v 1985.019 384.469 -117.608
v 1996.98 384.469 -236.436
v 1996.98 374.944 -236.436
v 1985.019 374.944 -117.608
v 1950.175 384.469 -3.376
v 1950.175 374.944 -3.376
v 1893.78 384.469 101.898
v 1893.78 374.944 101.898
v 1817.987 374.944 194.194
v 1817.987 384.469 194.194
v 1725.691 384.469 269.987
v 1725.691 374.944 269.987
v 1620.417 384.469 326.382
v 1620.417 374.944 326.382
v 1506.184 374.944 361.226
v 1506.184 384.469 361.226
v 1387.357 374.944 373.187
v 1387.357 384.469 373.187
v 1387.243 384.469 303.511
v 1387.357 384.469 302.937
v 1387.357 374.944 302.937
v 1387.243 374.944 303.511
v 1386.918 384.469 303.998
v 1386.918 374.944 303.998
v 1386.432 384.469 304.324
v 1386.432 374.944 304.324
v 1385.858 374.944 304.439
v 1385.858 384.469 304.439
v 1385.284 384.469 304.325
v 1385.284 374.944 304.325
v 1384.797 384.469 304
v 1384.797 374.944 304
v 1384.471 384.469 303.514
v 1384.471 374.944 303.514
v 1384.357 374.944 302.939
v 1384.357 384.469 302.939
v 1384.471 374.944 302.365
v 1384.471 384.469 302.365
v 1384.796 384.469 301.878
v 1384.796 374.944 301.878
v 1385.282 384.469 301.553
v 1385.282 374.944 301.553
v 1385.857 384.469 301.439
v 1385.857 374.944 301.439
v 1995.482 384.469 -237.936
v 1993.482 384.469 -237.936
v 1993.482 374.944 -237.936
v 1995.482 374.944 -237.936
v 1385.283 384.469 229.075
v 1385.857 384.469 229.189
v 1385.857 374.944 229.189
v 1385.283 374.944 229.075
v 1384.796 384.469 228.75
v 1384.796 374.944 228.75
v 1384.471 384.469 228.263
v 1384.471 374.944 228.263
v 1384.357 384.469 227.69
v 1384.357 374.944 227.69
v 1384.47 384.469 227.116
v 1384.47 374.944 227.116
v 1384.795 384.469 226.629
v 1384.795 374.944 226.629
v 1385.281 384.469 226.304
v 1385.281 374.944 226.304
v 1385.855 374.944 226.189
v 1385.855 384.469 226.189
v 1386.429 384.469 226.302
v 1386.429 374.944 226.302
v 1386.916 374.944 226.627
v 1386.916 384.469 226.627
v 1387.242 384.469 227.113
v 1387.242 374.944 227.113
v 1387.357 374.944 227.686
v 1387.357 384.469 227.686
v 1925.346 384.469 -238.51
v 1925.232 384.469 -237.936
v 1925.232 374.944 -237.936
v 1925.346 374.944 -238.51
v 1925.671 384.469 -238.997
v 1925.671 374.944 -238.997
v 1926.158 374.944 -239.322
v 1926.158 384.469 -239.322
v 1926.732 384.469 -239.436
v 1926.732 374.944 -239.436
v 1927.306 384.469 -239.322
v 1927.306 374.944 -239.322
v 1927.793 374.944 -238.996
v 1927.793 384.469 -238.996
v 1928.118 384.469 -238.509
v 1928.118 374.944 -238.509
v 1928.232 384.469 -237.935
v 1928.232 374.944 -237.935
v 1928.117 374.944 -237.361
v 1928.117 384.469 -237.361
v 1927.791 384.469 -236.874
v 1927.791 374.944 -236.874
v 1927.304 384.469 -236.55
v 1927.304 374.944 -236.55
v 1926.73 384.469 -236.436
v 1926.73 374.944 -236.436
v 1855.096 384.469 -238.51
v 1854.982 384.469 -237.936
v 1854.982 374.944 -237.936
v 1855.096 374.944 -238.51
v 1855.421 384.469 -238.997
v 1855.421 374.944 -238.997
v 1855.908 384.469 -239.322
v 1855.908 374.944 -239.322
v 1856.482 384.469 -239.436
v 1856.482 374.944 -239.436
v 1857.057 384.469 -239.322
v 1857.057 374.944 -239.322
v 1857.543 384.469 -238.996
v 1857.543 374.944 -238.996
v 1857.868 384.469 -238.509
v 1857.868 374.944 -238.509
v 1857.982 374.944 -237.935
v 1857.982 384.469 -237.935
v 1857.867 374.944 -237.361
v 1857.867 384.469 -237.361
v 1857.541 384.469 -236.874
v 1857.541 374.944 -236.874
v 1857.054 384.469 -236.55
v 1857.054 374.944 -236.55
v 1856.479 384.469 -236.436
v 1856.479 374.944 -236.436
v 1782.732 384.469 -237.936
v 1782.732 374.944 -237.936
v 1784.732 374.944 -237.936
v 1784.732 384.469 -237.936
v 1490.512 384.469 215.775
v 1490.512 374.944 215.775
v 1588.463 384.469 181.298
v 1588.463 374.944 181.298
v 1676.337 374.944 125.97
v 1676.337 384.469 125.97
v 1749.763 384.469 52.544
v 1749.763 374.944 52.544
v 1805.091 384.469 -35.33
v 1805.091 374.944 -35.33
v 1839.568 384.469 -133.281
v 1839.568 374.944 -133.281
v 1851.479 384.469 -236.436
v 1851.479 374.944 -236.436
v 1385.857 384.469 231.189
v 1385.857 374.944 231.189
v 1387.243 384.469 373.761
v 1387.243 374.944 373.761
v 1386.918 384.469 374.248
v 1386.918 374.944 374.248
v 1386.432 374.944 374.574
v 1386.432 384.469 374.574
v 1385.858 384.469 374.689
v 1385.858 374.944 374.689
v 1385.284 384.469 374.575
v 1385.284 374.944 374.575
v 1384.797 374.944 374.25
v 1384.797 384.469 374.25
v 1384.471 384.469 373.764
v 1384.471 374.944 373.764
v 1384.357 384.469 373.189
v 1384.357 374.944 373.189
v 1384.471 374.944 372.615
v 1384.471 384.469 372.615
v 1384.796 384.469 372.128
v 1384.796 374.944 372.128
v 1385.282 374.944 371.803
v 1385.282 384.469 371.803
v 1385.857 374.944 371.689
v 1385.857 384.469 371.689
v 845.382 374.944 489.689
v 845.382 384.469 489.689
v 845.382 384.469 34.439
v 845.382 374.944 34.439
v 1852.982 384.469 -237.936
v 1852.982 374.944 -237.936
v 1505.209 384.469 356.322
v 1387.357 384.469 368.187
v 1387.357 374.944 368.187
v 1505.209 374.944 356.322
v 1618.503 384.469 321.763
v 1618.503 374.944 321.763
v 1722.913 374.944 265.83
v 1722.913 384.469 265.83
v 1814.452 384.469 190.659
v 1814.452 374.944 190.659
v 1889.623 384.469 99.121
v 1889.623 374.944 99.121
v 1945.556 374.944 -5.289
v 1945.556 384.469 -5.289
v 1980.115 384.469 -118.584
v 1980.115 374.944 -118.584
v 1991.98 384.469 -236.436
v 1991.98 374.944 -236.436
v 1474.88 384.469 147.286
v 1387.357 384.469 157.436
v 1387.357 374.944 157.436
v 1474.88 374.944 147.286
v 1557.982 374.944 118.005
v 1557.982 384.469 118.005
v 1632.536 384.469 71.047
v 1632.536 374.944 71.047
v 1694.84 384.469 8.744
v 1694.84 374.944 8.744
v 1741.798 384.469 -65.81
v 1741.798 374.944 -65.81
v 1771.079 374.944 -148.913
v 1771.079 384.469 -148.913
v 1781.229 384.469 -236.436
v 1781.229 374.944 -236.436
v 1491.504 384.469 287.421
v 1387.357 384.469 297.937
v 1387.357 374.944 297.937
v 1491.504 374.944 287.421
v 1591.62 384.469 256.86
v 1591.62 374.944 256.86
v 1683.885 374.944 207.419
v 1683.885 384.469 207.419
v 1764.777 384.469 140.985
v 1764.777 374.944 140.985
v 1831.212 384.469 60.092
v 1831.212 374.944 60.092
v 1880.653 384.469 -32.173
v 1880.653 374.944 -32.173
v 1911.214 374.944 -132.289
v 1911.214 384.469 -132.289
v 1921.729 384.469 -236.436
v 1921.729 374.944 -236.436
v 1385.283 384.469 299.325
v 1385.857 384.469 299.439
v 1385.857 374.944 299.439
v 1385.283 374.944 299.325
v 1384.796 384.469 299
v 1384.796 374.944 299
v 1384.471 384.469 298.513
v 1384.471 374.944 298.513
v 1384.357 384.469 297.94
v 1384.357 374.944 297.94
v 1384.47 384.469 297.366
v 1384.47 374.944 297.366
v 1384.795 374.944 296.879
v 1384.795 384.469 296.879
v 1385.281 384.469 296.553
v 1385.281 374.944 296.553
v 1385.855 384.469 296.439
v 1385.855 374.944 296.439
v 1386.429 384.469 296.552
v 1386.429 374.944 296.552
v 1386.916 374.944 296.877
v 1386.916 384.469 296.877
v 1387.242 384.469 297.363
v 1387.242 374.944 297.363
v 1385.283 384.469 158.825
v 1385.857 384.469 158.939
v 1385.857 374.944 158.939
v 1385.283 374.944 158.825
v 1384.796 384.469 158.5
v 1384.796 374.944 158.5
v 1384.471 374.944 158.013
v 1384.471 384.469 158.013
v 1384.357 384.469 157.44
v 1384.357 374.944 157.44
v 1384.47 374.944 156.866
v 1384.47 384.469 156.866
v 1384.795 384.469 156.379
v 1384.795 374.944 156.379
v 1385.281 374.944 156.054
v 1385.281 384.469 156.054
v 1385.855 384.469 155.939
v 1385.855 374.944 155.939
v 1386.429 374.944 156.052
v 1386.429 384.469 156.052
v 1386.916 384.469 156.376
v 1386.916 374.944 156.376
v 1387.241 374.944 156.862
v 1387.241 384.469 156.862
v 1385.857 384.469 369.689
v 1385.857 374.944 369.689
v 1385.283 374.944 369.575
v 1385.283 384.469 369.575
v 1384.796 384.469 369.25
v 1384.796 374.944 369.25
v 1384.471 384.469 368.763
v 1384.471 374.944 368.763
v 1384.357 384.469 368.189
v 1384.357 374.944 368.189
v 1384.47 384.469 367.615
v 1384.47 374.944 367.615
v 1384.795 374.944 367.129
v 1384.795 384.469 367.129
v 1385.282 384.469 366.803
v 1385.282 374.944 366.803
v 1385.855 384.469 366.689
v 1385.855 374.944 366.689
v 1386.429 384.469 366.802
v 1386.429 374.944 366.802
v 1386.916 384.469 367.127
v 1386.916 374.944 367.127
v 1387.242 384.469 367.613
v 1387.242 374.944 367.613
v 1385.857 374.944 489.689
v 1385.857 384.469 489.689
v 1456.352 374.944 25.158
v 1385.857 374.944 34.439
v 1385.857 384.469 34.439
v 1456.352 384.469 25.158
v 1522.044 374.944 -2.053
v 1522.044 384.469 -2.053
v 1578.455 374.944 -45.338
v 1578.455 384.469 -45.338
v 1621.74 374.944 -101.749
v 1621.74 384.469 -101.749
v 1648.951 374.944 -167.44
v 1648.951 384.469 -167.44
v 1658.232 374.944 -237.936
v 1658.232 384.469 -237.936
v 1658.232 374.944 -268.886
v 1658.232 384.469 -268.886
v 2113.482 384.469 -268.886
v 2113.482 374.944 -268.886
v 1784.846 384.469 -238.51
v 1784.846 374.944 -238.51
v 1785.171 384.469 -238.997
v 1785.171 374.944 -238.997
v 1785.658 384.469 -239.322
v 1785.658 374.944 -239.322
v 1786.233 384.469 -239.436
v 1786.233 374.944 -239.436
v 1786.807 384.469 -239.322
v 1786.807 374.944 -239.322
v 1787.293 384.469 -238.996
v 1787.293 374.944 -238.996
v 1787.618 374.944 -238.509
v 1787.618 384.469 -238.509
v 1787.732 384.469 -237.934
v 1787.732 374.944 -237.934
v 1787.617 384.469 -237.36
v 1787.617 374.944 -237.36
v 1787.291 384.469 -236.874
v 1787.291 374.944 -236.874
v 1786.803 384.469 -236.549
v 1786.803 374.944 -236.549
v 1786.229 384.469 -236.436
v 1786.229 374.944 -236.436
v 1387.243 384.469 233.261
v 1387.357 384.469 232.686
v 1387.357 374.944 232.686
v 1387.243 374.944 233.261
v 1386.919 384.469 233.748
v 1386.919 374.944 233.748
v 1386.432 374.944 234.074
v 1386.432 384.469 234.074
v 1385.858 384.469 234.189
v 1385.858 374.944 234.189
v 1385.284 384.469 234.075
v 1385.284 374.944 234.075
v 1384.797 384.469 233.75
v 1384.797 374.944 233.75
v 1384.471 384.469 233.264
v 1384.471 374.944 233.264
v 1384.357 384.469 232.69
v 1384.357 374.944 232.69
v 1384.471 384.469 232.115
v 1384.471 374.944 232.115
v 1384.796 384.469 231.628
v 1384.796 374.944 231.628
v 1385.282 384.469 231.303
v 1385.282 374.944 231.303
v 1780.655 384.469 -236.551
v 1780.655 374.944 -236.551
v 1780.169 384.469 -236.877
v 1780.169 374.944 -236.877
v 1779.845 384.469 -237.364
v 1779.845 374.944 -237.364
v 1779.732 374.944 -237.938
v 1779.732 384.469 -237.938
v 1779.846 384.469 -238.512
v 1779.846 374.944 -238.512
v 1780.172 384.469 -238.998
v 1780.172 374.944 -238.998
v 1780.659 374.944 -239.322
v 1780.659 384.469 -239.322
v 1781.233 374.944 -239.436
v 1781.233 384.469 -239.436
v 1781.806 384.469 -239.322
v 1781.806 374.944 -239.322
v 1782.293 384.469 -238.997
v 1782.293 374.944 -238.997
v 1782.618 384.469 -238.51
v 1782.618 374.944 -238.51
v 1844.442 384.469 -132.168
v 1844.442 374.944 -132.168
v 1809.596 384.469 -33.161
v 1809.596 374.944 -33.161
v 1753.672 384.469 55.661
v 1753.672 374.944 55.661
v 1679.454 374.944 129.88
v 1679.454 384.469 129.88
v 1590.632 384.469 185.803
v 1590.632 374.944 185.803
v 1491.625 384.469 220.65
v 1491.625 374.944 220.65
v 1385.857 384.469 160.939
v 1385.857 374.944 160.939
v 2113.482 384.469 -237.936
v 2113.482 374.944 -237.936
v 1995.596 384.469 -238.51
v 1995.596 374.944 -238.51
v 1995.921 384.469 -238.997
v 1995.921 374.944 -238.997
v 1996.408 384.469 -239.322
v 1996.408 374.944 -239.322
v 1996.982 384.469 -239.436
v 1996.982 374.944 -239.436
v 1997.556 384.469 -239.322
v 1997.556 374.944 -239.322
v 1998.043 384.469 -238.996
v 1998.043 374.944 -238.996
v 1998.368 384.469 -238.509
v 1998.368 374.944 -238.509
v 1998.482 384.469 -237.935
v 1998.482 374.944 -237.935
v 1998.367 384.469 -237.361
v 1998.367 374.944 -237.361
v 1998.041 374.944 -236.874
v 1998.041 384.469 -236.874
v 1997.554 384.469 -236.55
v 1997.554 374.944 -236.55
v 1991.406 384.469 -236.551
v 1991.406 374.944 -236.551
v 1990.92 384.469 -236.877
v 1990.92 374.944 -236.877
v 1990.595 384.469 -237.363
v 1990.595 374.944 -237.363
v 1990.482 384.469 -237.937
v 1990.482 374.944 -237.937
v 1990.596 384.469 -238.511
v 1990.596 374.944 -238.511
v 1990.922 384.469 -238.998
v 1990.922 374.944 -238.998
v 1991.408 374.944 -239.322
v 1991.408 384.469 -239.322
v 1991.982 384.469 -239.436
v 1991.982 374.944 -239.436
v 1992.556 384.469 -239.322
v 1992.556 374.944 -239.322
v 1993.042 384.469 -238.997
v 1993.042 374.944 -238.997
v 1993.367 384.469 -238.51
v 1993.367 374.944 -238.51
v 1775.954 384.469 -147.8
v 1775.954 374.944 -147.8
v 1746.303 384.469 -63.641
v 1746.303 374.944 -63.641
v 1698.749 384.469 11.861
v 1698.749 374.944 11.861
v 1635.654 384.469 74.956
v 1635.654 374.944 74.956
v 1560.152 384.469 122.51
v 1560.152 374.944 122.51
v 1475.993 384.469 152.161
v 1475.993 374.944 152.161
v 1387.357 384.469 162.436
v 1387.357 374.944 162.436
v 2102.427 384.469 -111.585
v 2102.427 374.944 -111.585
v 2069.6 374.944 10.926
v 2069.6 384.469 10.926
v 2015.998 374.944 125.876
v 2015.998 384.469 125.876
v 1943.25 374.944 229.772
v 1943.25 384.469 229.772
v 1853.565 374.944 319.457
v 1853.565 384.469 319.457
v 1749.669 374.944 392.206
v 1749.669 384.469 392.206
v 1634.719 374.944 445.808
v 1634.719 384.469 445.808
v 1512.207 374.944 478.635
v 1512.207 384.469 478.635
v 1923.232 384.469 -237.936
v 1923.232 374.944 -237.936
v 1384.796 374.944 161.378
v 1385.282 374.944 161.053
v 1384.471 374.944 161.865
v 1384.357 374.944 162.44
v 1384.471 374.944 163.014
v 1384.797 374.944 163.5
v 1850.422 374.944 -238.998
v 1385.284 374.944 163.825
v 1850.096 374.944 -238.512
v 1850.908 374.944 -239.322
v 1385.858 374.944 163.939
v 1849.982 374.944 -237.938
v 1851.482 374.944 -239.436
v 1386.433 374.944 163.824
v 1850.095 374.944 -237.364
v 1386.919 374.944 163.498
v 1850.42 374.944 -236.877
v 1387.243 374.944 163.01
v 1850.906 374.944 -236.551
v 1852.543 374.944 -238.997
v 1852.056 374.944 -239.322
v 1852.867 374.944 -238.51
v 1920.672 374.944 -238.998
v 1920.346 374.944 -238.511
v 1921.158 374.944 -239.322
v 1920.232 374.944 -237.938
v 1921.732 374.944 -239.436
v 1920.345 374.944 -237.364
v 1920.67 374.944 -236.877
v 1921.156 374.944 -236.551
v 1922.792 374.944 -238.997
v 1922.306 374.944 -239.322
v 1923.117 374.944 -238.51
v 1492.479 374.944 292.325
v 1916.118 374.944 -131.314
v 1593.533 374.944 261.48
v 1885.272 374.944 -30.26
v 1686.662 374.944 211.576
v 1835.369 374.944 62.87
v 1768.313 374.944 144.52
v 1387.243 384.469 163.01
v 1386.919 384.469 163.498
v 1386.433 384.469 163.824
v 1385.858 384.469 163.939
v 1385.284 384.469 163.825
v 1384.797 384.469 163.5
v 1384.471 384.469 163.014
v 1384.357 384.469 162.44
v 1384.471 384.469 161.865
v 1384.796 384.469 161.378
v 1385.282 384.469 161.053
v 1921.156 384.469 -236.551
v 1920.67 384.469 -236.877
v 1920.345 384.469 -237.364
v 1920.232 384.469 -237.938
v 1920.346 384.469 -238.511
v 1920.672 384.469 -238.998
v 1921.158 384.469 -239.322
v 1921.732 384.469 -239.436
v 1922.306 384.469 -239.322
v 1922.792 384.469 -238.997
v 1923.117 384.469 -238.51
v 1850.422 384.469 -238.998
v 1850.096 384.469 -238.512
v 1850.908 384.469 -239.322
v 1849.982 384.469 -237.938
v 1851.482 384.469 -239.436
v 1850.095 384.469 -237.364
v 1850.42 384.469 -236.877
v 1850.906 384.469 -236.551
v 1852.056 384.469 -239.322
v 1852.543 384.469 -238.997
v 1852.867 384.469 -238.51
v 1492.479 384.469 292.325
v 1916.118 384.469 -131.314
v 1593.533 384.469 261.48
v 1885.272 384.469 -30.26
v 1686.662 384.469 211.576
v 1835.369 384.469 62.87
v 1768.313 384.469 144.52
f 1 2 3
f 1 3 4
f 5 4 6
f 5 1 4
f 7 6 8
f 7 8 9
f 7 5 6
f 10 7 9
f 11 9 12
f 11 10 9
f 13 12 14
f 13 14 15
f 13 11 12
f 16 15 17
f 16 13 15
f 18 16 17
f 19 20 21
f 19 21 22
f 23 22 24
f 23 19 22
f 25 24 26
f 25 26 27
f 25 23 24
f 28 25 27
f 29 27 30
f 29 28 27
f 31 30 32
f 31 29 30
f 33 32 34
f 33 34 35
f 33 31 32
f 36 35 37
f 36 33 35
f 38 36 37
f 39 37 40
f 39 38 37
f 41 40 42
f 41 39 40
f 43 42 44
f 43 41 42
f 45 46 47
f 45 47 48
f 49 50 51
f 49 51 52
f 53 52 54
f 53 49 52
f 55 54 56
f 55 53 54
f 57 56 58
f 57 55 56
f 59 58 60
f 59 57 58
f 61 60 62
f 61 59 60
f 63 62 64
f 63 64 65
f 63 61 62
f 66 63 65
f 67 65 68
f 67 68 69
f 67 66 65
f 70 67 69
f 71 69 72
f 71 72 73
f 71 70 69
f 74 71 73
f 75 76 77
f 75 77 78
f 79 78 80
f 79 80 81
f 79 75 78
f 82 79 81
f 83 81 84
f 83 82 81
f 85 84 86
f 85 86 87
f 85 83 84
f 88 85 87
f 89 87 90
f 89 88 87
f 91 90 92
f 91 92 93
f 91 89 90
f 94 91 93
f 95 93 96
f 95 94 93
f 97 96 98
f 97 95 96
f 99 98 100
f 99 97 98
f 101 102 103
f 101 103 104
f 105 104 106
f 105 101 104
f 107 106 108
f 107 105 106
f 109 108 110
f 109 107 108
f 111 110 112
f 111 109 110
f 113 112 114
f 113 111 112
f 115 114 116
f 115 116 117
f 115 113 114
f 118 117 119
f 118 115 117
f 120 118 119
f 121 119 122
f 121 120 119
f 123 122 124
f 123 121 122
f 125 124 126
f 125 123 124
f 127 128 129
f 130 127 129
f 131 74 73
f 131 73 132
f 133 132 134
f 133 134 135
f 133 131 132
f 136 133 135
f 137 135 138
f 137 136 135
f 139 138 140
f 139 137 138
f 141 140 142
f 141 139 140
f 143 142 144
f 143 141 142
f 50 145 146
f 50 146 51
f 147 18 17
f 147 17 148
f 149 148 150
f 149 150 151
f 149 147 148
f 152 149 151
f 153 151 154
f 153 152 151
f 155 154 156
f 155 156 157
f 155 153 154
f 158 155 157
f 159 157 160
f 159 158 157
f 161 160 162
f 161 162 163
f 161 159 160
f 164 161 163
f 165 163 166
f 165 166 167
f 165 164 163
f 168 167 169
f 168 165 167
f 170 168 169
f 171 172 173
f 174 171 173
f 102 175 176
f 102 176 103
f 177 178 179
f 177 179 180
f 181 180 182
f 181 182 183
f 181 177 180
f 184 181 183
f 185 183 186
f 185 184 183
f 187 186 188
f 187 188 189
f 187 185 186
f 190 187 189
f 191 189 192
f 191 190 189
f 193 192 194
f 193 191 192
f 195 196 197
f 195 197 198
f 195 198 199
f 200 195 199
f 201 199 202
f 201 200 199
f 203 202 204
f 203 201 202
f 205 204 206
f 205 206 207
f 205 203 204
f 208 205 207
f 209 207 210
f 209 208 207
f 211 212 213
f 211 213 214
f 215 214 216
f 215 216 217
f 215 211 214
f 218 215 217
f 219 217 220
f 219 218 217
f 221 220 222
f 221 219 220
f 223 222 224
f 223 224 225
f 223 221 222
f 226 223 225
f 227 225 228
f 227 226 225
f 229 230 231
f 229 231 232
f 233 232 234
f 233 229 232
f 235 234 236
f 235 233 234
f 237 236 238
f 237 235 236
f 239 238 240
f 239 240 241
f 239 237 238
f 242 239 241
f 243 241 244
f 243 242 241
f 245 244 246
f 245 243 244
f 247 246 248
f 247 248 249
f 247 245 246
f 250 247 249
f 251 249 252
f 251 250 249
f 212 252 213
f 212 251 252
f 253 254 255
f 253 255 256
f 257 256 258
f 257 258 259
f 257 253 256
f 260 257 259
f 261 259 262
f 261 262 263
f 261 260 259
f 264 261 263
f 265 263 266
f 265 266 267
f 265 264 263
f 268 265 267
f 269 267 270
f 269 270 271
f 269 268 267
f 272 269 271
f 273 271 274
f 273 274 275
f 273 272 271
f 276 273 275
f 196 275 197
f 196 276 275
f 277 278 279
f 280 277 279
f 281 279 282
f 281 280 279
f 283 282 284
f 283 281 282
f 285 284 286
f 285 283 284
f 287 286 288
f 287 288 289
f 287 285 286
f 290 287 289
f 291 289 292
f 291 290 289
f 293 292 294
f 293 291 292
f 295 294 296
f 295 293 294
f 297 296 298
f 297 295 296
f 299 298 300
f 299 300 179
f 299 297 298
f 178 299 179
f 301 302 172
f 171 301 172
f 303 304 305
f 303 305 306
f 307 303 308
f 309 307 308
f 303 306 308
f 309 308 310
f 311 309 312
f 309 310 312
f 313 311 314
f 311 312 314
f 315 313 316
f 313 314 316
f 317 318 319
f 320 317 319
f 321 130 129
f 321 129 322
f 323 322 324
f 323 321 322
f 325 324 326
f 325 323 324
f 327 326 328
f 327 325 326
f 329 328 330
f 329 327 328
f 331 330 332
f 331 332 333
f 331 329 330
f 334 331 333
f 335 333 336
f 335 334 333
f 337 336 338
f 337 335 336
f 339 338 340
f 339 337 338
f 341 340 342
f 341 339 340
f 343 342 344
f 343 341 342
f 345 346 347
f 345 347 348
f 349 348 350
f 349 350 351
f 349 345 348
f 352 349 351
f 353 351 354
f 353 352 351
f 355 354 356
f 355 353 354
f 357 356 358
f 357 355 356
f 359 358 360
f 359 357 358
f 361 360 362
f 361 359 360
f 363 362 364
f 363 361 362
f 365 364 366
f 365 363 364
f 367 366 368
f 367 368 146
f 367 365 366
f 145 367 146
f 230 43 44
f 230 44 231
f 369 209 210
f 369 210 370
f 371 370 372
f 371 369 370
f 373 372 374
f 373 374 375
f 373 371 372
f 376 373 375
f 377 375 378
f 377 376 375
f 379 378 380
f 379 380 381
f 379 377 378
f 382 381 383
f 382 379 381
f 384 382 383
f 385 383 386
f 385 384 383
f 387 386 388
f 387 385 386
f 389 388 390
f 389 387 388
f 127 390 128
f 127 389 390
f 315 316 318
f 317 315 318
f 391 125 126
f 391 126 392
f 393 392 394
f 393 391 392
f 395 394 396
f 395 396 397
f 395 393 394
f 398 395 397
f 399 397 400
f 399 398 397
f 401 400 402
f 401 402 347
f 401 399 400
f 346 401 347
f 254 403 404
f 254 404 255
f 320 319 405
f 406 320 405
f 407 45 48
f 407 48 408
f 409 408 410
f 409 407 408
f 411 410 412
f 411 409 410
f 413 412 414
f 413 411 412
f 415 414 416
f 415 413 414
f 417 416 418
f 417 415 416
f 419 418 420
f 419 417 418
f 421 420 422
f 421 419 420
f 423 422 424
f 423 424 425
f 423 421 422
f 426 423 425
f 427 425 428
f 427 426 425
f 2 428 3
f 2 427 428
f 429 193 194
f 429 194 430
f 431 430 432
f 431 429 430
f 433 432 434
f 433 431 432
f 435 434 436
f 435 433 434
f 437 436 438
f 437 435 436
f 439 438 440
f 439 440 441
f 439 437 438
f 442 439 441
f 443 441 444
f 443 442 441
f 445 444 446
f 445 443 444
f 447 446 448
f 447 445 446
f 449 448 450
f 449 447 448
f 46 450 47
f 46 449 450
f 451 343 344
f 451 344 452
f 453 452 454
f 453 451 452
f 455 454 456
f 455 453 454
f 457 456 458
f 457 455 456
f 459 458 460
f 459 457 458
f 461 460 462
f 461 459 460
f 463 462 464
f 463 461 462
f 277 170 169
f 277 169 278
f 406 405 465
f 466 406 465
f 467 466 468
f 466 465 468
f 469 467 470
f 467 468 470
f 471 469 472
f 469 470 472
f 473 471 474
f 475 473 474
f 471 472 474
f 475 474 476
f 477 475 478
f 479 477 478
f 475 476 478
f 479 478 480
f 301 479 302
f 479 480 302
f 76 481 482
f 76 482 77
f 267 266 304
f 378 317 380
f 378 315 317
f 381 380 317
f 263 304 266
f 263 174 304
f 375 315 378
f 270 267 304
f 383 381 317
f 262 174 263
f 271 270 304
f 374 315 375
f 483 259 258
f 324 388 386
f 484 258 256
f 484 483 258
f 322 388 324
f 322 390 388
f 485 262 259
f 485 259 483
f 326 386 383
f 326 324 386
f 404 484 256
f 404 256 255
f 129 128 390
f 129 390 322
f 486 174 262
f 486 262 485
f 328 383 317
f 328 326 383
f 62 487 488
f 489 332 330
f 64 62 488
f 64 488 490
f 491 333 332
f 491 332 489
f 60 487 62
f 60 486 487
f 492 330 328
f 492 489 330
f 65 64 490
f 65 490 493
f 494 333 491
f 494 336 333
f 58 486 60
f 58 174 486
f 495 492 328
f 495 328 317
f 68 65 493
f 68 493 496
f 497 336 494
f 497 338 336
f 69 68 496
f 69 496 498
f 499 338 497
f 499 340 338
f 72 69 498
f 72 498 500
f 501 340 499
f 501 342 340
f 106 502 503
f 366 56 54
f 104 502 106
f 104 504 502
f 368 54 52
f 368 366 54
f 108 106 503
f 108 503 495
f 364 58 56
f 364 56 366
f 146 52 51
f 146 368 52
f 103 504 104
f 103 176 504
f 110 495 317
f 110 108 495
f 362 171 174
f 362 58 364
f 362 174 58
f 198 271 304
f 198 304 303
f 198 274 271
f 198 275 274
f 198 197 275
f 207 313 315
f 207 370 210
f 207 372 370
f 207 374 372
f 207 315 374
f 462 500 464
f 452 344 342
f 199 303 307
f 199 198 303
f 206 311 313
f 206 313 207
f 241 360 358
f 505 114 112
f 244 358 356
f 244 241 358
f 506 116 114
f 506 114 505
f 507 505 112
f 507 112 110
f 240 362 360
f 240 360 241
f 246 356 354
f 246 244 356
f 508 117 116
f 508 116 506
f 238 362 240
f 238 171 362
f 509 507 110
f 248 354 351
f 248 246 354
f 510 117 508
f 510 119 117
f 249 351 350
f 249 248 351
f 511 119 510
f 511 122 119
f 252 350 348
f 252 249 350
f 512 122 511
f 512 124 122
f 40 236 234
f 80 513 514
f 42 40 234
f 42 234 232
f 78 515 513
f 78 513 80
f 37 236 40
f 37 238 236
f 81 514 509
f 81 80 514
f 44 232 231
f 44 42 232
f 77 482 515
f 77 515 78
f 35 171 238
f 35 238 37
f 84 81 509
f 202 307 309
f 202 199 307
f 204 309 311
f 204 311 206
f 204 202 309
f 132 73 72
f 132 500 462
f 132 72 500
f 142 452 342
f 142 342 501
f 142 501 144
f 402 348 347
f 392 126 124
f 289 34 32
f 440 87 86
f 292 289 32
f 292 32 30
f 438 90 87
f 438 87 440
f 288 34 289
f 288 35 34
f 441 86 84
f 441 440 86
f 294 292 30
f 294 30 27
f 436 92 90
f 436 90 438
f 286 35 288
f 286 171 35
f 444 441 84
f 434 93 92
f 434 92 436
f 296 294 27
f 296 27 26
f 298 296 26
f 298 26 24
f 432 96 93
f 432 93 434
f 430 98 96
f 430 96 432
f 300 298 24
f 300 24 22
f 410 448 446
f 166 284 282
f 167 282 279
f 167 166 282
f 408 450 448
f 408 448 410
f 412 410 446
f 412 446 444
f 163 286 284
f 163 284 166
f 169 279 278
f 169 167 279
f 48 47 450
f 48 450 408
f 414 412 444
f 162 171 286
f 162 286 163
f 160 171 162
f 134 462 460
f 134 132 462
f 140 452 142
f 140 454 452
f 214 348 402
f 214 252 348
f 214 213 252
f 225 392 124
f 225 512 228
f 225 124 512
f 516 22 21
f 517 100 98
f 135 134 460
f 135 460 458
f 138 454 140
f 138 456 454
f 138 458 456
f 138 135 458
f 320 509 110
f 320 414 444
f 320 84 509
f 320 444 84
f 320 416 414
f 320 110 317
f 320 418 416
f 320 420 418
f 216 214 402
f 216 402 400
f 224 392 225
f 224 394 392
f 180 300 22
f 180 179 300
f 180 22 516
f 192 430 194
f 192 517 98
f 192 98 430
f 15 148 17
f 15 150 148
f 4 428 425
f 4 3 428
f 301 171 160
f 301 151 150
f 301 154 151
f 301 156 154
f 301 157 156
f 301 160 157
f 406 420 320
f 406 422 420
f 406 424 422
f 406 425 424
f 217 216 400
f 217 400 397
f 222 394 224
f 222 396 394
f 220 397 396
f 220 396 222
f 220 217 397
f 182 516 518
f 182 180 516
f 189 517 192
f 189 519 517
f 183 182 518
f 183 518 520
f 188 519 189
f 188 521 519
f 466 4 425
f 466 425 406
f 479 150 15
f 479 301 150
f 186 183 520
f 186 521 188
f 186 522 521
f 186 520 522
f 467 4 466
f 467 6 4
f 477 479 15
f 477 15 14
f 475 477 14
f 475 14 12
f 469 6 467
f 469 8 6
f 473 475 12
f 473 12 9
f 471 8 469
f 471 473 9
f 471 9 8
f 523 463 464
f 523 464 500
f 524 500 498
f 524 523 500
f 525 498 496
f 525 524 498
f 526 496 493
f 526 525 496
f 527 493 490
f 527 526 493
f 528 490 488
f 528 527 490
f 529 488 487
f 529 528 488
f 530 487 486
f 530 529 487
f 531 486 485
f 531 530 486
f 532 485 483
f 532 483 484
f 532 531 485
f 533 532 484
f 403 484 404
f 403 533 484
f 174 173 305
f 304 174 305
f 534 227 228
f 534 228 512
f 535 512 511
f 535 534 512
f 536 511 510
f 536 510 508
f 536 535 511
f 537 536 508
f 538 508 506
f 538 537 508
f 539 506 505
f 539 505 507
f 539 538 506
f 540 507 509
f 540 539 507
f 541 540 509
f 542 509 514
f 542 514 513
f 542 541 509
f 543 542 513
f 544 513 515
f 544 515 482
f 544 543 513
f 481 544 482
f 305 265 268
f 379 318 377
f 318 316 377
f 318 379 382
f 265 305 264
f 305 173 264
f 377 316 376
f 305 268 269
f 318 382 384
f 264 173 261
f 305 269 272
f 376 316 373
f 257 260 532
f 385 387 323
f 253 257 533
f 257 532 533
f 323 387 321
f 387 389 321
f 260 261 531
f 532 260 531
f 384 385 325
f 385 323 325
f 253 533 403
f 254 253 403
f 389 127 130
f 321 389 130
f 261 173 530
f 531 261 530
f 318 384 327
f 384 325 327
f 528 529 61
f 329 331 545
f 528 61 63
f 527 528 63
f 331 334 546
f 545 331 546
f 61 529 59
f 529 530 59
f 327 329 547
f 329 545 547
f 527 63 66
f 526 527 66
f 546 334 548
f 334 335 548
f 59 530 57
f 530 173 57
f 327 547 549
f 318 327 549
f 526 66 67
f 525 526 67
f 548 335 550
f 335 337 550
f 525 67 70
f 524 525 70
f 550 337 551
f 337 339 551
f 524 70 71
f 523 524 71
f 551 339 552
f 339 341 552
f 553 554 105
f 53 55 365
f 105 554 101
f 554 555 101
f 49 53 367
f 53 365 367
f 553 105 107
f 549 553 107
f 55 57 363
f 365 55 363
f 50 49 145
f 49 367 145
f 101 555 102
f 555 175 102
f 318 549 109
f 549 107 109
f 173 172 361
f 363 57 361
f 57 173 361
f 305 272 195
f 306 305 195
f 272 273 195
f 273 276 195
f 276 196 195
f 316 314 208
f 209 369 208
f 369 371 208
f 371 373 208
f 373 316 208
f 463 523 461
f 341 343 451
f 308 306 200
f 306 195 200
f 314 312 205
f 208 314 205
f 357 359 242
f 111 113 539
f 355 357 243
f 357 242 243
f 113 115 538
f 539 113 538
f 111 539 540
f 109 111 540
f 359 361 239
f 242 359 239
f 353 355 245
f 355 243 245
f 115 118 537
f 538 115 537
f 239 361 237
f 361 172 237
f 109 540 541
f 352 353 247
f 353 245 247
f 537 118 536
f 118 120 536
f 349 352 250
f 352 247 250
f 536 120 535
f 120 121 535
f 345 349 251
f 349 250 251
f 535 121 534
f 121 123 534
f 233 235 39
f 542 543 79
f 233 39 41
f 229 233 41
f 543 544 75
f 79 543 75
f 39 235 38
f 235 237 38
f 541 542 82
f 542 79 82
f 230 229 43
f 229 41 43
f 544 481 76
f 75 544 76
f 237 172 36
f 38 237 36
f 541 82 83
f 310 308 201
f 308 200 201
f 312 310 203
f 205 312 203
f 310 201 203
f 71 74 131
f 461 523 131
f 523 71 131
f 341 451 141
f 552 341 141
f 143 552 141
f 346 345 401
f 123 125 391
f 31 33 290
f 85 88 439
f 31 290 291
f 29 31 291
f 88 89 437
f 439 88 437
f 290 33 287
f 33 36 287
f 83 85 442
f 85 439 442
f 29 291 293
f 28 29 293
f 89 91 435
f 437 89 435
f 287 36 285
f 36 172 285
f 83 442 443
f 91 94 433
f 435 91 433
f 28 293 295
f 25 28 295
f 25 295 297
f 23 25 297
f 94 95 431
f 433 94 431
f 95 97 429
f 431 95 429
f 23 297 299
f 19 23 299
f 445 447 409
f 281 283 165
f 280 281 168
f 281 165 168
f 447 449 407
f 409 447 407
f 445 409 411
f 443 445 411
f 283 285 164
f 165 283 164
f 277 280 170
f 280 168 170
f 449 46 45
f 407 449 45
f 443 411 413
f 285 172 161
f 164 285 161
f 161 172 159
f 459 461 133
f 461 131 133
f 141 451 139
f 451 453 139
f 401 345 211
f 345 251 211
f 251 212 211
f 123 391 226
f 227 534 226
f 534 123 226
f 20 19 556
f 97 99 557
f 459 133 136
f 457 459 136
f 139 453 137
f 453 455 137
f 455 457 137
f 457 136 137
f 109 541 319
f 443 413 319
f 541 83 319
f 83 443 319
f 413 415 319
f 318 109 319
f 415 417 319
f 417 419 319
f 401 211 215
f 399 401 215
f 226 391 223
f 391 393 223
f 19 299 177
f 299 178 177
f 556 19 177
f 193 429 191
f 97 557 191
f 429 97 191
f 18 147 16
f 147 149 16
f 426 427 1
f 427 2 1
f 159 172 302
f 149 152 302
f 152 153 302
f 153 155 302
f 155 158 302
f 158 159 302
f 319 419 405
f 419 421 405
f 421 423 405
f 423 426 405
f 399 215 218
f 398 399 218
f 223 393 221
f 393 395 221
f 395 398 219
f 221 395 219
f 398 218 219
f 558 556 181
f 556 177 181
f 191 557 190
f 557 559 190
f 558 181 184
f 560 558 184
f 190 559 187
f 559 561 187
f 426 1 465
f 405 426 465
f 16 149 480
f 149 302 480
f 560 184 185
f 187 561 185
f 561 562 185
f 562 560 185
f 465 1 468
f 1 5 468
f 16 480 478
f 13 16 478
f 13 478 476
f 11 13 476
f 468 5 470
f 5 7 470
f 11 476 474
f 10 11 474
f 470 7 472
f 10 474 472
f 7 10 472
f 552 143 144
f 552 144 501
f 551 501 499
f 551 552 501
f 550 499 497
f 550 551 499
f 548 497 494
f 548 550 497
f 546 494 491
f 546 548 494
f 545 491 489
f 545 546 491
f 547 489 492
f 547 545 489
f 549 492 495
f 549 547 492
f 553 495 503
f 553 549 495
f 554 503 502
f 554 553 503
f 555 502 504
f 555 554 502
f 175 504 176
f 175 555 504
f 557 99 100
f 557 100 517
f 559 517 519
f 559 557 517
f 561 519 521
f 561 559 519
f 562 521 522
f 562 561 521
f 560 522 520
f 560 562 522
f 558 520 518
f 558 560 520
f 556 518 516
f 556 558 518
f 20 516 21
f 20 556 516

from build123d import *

# Parameters (mm, degrees)
BOSS_EXTRUDE1_DEPTH = 9.525


with BuildPart() as part:
    # Sketch1 → Boss-Extrude1 (new body)
    with BuildSketch(Plane.XZ.offset(-384.4690372)):
        with BuildLine():
            Line((1658.231590128, -268.886195663), (2113.481590128, -268.886195663))
            Line((2113.481590128, -268.886195663), (2113.481590128, -237.936195663))
            ThreePointArc((2113.481590128, -237.936195663), (1900.365161789, 276.572375998), (1385.856590128, 489.688804337))
            Line((1385.856590128, 489.688804337), (845.381590128, 489.688804337))
            Line((845.381590128, 489.688804337), (845.381590128, 34.438804337))
            Line((845.381590128, 34.438804337), (1385.856590128, 34.438804337))
            ThreePointArc((1385.856590128, 34.438804337), (1578.454799653, -45.337986138), (1658.231590128, -237.936195663))
            Line((1658.231590128, -237.936195663), (1658.231590128, -268.886195663))
        make_face()
        with BuildLine():
            Line((1782.731590128, -237.936195663), (1784.731590128, -237.936195663))
            ThreePointArc((1784.731590128, -237.936195663), (1787.293243272, -238.995861932), (1786.228780262, -236.436198295))
            ThreePointArc((1786.228780262, -236.436198295), (1668.964467645, 45.171681854), (1387.356587496, 162.435994471))
            ThreePointArc((1387.356587496, 162.435994471), (1384.796923859, 163.500457481), (1385.856590128, 160.938804337))
            Line((1385.856590128, 160.938804337), (1385.856590128, 158.938804337))
            ThreePointArc((1385.856590128, 158.938804337), (1384.794924432, 156.379150643), (1387.356587429, 157.435958937))
            ThreePointArc((1387.356587429, 157.435958937), (1665.428933739, 41.636147948), (1781.228744728, -236.436198362))
            ThreePointArc((1781.228744728, -236.436198362), (1780.171936434, -238.997861359), (1782.731590128, -237.936195663))
        make_face(mode=Mode.SUBTRACT)
        with BuildLine():
            Line((1993.481590128, -237.936195663), (1995.481590128, -237.936195663))
            ThreePointArc((1995.481590128, -237.936195663), (1998.042900945, -238.99620479), (1996.979749261, -236.436196793))
            ThreePointArc((1996.979749261, -236.436196793), (1817.98722178, 194.194435989), (1387.356588998, 373.186963469))
            ThreePointArc((1387.356588998, 373.186963469), (1384.796581001, 374.250115154), (1385.856590128, 371.688804337))
            Line((1385.856590128, 371.688804337), (1385.856590128, 369.688804337))
            ThreePointArc((1385.856590128, 369.688804337), (1384.795273945, 367.128800582), (1387.356588979, 368.186948284))
            ThreePointArc((1387.356588979, 368.186948284), (1814.451687874, 190.658902083), (1991.979734075, -236.436196812))
            ThreePointArc((1991.979734075, -236.436196812), (1990.921586373, -238.997511846), (1993.481590128, -237.936195663))
        make_face(mode=Mode.SUBTRACT)
        with BuildLine():
            Line((1923.231590128, -237.936195663), (1925.231590128, -237.936195663))
            ThreePointArc((1925.231590128, -237.936195663), (1927.792985423, -238.996120202), (1926.729510165, -236.436197105))
            ThreePointArc((1926.729510165, -236.436197105), (1768.312970402, 144.520184611), (1387.356588686, 302.936724374))
            ThreePointArc((1387.356588686, 302.936724374), (1384.796665589, 304.000199632), (1385.856590128, 301.438804337))
            Line((1385.856590128, 301.438804337), (1385.856590128, 299.438804337))
            ThreePointArc((1385.856590128, 299.438804337), (1384.795187976, 296.878886664), (1387.356588659, 297.936704967))
            ThreePointArc((1387.356588659, 297.936704967), (1764.777436496, 140.984650705), (1921.729490758, -236.436197132))
            ThreePointArc((1921.729490758, -236.436197132), (1920.671672455, -238.997597815), (1923.231590128, -237.936195663))
        make_face(mode=Mode.SUBTRACT)
        with BuildLine():
            Line((1852.981590128, -237.936195663), (1854.981590128, -237.936195663))
            ThreePointArc((1854.981590128, -237.936195663), (1857.543095111, -238.996010351), (1856.47919969, -236.436197568))
            ThreePointArc((1856.47919969, -236.436197568), (1718.638719024, 94.845933233), (1387.356588223, 232.686413898))
            ThreePointArc((1387.356588223, 232.686413898), (1384.796775441, 233.75030932), (1385.856590128, 231.188804337))
            Line((1385.856590128, 231.188804337), (1385.856590128, 229.188804337))
            ThreePointArc((1385.856590128, 229.188804337), (1384.795076077, 226.628998732), (1387.356588182, 227.686388229))
            ThreePointArc((1387.356588182, 227.686388229), (1715.103185118, 91.310399327), (1851.47917402, -236.436197609))
            ThreePointArc((1851.47917402, -236.436197609), (1850.421784523, -238.997709714), (1852.981590128, -237.936195663))
        make_face(mode=Mode.SUBTRACT)
    extrude(amount=BOSS_EXTRUDE1_DEPTH)


solid = part.part
